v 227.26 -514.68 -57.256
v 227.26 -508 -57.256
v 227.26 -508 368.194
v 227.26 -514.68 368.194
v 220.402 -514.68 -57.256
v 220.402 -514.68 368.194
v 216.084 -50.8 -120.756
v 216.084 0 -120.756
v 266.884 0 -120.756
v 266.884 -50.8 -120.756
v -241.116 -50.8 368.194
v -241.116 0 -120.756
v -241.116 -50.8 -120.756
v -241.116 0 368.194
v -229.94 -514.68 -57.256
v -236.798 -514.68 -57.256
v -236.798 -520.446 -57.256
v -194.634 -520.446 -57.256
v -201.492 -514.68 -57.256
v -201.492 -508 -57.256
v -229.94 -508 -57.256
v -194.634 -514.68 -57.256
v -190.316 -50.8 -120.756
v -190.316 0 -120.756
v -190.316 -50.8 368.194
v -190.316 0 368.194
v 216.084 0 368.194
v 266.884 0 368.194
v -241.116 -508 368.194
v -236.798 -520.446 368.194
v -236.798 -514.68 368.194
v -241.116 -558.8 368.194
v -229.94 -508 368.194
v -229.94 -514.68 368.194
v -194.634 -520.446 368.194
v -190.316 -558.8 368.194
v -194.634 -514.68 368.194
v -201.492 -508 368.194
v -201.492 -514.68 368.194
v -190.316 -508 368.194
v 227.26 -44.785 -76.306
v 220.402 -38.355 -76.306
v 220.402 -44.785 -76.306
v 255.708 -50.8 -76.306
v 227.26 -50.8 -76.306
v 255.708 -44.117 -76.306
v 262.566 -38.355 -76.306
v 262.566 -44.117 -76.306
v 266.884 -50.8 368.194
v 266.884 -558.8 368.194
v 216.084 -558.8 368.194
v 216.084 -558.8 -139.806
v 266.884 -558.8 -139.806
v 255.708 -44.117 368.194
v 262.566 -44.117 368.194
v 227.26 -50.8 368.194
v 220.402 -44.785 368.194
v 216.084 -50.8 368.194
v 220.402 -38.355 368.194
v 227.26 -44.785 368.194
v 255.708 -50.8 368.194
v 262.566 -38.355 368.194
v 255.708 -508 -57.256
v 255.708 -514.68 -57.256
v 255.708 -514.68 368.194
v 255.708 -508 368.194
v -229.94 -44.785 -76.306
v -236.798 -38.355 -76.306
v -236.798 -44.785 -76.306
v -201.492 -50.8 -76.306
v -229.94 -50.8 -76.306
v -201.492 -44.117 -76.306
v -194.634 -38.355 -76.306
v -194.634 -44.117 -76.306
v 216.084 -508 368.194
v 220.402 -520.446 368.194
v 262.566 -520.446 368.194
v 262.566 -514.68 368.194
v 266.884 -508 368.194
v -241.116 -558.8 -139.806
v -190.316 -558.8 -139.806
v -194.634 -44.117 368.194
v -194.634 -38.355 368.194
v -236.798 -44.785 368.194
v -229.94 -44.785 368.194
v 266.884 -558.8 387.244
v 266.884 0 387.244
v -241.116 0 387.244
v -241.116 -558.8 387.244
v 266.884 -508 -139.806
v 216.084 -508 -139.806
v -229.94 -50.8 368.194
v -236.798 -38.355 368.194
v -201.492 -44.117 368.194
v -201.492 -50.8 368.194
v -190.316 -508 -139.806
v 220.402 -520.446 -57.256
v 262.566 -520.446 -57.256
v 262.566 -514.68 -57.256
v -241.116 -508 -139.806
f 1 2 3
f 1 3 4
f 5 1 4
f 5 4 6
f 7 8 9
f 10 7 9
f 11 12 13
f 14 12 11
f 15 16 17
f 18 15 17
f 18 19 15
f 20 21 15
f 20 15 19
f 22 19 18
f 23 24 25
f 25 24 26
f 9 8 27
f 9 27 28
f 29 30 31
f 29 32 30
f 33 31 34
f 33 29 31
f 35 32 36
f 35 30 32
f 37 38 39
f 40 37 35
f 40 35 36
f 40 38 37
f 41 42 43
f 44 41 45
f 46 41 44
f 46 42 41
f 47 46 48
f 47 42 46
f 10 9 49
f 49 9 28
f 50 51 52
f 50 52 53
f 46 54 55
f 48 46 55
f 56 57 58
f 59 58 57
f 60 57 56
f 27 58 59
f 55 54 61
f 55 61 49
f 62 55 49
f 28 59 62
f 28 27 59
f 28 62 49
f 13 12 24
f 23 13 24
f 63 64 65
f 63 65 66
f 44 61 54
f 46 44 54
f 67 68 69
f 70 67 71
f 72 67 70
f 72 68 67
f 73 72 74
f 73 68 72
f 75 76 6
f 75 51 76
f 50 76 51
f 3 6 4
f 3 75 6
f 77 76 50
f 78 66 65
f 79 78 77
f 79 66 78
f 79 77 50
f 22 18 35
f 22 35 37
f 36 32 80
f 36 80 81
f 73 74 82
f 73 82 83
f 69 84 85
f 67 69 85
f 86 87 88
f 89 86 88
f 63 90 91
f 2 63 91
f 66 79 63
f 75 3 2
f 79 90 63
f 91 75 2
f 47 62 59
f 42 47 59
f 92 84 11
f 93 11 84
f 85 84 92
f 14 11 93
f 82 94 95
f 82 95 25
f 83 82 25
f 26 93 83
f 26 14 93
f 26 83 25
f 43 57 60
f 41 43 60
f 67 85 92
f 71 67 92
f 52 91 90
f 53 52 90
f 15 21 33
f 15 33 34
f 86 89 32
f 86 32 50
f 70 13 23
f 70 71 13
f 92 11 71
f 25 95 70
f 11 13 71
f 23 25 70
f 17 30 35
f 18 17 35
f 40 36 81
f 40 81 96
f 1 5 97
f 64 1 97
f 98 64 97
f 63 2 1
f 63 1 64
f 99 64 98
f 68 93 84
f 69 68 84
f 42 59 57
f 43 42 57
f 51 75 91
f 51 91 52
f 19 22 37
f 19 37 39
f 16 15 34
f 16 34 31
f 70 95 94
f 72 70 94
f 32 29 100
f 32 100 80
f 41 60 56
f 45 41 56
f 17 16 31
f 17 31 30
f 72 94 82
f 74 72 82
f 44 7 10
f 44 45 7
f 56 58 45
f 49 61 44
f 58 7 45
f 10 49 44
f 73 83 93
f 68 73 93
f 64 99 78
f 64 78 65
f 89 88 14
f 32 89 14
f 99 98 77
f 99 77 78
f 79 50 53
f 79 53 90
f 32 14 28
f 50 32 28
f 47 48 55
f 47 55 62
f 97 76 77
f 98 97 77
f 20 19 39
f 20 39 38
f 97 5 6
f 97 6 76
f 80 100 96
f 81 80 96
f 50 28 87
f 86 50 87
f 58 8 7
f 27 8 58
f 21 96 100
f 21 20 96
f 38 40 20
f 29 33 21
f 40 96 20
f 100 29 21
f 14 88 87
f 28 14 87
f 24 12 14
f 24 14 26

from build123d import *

# Parameters (mm, degrees)
F0_W      = 50.8
F0_H      = 488.95
F1_DEPTH  = 50.8
F3_DEPTH  = 444.5
F5_DEPTH  = 444.5
F6_DEPTH  = 558.8
F8_START  = -19.05
F8_DEPTH  = 508
F9_START  = -19.05
F9_DEPTH  = 425.45
F10_START = -19.05
F10_DEPTH = 425.45


with BuildPart() as f1:
    # F0 (on Front) → F1 (new body)
    with BuildSketch(Plane.XZ):
        with Locations((-215.7162436903, 123.7191561818)):
            Rectangle(F0_W, F0_H)
    extrude(amount=F1_DEPTH)

    # F2 (on face) → F3 (cut)
    with BuildSketch(Plane.XY.offset(368.1941561818)):
        Polygon((-229.9402436903, -44.7851385266), (-229.9402436903, -50.8), (-201.4922436903, -50.8), (-201.4922436903, -44.1170856357), (-194.6342436903, -44.1170856357), (-194.6342436903, -38.3547544479), (-236.7982436903, -38.3547544479), (-236.7982436903, -44.7851385266), align=None)
    extrude(amount=-F3_DEPTH, mode=Mode.SUBTRACT)

    # F7 (on face) → F10 (cut)
    with BuildSketch(Plane.XY.offset(387.2441561818).offset(F10_START)):
        Polygon((255.7077563097, -514.6802), (255.7077563097, -508), (227.2597563097, -508), (227.2597563097, -514.6802), (220.4017563097, -514.6802), (220.4017563097, -520.446), (262.5657563097, -520.446), (262.5657563097, -514.6802), align=None)
    extrude(amount=-F10_DEPTH, mode=Mode.SUBTRACT)


with BuildPart() as f1b:
    # F0 (on Front) → F1, piece 2 (new body)
    with BuildSketch(Plane.XZ):
        with Locations((241.4837563097, 123.7191561818)):
            Rectangle(F0_W, F0_H)
    extrude(amount=F1_DEPTH)

    # F4 (on face) → F5 (cut)
    with BuildSketch(Plane.XY.offset(368.1941561818)):
        Polygon((227.2597563097, -44.7851385266), (227.2597563097, -50.8), (255.7077563097, -50.8), (255.7077563097, -44.1170856357), (262.5657563097, -44.1170856357), (262.5657563097, -38.3547544479), (220.4017563097, -38.3547544479), (220.4017563097, -44.7851385266), align=None)
    extrude(amount=-F5_DEPTH, mode=Mode.SUBTRACT)


with BuildPart() as f6:
    # F0 (on Front) → F6 (new body)
    with BuildSketch(Plane.XZ):
        Polygon((266.8837563097, 387.2441561818), (-241.1162436903, 387.2441561818), (-241.1162436903, 368.1941561818), (-190.3162436903, 368.1941561818), (216.0837563097, 368.1941561818), (266.8837563097, 368.1941561818), align=None)
    extrude(amount=F6_DEPTH)


with BuildPart() as f8:
    # F7 (on face) → F8 (new body)
    with BuildSketch(Plane.XY.offset(387.2441561818).offset(F8_START)):
        Polygon((216.0837563097, -508), (216.0837563097, -558.8), (266.8837563097, -558.8), (266.8837563097, -508), (255.7077563097, -508), (255.7077563097, -514.6802), (262.5657563097, -514.6802), (262.5657563097, -520.446), (220.4017563097, -520.446), (220.4017563097, -514.6802), (227.2597563097, -514.6802), (227.2597563097, -508), align=None)
        Polygon((255.7077563097, -514.6802), (255.7077563097, -508), (227.2597563097, -508), (227.2597563097, -514.6802), (220.4017563097, -514.6802), (220.4017563097, -520.446), (262.5657563097, -520.446), (262.5657563097, -514.6802), align=None)
    extrude(amount=-F8_DEPTH)


with BuildPart() as f8b:
    # F7 (on face) → F8, piece 2 (new body)
    with BuildSketch(Plane.XY.offset(387.2441561818).offset(F8_START)):
        Polygon((-229.9402436903, -508), (-241.1162436903, -508), (-241.1162436903, -558.8), (-190.3162436903, -558.8), (-190.3162436903, -508), (-201.4922436903, -508), (-201.4922436903, -514.6802), (-194.6342436903, -514.6802), (-194.6342436903, -520.446), (-236.7982436903, -520.446), (-236.7982436903, -514.6802), (-229.9402436903, -514.6802), align=None)
        Polygon((-201.4922436903, -508), (-229.9402436903, -508), (-229.9402436903, -514.6802), (-236.7982436903, -514.6802), (-236.7982436903, -520.446), (-194.6342436903, -520.446), (-194.6342436903, -514.6802), (-201.4922436903, -514.6802), align=None)
    extrude(amount=-F8_DEPTH)


with BuildPart() as f9_tool:
    # F7 (on face) → F9 (new body)
    with BuildSketch(Plane.XY.offset(387.2441561818).offset(F9_START)):
        Polygon((-201.4922436903, -508), (-229.9402436903, -508), (-229.9402436903, -514.6802), (-236.7982436903, -514.6802), (-236.7982436903, -520.446), (-194.6342436903, -520.446), (-194.6342436903, -514.6802), (-201.4922436903, -514.6802), align=None)
        Polygon((255.7077563097, -514.6802), (255.7077563097, -508), (227.2597563097, -508), (227.2597563097, -514.6802), (220.4017563097, -514.6802), (220.4017563097, -520.446), (262.5657563097, -520.446), (262.5657563097, -514.6802), align=None)
    extrude(amount=-F9_DEPTH)


with BuildPart() as f8_1:
    add(f8.part)

    # F9: cut by f9_tool
    add(f9_tool.part, mode=Mode.SUBTRACT)


with BuildPart() as f8b_1:
    add(f8b.part)

    # F9: cut by f9_tool
    add(f9_tool.part, mode=Mode.SUBTRACT)


solid = Compound([f1.part, f1b.part, f6.part, f8_1.part, f8b_1.part])
